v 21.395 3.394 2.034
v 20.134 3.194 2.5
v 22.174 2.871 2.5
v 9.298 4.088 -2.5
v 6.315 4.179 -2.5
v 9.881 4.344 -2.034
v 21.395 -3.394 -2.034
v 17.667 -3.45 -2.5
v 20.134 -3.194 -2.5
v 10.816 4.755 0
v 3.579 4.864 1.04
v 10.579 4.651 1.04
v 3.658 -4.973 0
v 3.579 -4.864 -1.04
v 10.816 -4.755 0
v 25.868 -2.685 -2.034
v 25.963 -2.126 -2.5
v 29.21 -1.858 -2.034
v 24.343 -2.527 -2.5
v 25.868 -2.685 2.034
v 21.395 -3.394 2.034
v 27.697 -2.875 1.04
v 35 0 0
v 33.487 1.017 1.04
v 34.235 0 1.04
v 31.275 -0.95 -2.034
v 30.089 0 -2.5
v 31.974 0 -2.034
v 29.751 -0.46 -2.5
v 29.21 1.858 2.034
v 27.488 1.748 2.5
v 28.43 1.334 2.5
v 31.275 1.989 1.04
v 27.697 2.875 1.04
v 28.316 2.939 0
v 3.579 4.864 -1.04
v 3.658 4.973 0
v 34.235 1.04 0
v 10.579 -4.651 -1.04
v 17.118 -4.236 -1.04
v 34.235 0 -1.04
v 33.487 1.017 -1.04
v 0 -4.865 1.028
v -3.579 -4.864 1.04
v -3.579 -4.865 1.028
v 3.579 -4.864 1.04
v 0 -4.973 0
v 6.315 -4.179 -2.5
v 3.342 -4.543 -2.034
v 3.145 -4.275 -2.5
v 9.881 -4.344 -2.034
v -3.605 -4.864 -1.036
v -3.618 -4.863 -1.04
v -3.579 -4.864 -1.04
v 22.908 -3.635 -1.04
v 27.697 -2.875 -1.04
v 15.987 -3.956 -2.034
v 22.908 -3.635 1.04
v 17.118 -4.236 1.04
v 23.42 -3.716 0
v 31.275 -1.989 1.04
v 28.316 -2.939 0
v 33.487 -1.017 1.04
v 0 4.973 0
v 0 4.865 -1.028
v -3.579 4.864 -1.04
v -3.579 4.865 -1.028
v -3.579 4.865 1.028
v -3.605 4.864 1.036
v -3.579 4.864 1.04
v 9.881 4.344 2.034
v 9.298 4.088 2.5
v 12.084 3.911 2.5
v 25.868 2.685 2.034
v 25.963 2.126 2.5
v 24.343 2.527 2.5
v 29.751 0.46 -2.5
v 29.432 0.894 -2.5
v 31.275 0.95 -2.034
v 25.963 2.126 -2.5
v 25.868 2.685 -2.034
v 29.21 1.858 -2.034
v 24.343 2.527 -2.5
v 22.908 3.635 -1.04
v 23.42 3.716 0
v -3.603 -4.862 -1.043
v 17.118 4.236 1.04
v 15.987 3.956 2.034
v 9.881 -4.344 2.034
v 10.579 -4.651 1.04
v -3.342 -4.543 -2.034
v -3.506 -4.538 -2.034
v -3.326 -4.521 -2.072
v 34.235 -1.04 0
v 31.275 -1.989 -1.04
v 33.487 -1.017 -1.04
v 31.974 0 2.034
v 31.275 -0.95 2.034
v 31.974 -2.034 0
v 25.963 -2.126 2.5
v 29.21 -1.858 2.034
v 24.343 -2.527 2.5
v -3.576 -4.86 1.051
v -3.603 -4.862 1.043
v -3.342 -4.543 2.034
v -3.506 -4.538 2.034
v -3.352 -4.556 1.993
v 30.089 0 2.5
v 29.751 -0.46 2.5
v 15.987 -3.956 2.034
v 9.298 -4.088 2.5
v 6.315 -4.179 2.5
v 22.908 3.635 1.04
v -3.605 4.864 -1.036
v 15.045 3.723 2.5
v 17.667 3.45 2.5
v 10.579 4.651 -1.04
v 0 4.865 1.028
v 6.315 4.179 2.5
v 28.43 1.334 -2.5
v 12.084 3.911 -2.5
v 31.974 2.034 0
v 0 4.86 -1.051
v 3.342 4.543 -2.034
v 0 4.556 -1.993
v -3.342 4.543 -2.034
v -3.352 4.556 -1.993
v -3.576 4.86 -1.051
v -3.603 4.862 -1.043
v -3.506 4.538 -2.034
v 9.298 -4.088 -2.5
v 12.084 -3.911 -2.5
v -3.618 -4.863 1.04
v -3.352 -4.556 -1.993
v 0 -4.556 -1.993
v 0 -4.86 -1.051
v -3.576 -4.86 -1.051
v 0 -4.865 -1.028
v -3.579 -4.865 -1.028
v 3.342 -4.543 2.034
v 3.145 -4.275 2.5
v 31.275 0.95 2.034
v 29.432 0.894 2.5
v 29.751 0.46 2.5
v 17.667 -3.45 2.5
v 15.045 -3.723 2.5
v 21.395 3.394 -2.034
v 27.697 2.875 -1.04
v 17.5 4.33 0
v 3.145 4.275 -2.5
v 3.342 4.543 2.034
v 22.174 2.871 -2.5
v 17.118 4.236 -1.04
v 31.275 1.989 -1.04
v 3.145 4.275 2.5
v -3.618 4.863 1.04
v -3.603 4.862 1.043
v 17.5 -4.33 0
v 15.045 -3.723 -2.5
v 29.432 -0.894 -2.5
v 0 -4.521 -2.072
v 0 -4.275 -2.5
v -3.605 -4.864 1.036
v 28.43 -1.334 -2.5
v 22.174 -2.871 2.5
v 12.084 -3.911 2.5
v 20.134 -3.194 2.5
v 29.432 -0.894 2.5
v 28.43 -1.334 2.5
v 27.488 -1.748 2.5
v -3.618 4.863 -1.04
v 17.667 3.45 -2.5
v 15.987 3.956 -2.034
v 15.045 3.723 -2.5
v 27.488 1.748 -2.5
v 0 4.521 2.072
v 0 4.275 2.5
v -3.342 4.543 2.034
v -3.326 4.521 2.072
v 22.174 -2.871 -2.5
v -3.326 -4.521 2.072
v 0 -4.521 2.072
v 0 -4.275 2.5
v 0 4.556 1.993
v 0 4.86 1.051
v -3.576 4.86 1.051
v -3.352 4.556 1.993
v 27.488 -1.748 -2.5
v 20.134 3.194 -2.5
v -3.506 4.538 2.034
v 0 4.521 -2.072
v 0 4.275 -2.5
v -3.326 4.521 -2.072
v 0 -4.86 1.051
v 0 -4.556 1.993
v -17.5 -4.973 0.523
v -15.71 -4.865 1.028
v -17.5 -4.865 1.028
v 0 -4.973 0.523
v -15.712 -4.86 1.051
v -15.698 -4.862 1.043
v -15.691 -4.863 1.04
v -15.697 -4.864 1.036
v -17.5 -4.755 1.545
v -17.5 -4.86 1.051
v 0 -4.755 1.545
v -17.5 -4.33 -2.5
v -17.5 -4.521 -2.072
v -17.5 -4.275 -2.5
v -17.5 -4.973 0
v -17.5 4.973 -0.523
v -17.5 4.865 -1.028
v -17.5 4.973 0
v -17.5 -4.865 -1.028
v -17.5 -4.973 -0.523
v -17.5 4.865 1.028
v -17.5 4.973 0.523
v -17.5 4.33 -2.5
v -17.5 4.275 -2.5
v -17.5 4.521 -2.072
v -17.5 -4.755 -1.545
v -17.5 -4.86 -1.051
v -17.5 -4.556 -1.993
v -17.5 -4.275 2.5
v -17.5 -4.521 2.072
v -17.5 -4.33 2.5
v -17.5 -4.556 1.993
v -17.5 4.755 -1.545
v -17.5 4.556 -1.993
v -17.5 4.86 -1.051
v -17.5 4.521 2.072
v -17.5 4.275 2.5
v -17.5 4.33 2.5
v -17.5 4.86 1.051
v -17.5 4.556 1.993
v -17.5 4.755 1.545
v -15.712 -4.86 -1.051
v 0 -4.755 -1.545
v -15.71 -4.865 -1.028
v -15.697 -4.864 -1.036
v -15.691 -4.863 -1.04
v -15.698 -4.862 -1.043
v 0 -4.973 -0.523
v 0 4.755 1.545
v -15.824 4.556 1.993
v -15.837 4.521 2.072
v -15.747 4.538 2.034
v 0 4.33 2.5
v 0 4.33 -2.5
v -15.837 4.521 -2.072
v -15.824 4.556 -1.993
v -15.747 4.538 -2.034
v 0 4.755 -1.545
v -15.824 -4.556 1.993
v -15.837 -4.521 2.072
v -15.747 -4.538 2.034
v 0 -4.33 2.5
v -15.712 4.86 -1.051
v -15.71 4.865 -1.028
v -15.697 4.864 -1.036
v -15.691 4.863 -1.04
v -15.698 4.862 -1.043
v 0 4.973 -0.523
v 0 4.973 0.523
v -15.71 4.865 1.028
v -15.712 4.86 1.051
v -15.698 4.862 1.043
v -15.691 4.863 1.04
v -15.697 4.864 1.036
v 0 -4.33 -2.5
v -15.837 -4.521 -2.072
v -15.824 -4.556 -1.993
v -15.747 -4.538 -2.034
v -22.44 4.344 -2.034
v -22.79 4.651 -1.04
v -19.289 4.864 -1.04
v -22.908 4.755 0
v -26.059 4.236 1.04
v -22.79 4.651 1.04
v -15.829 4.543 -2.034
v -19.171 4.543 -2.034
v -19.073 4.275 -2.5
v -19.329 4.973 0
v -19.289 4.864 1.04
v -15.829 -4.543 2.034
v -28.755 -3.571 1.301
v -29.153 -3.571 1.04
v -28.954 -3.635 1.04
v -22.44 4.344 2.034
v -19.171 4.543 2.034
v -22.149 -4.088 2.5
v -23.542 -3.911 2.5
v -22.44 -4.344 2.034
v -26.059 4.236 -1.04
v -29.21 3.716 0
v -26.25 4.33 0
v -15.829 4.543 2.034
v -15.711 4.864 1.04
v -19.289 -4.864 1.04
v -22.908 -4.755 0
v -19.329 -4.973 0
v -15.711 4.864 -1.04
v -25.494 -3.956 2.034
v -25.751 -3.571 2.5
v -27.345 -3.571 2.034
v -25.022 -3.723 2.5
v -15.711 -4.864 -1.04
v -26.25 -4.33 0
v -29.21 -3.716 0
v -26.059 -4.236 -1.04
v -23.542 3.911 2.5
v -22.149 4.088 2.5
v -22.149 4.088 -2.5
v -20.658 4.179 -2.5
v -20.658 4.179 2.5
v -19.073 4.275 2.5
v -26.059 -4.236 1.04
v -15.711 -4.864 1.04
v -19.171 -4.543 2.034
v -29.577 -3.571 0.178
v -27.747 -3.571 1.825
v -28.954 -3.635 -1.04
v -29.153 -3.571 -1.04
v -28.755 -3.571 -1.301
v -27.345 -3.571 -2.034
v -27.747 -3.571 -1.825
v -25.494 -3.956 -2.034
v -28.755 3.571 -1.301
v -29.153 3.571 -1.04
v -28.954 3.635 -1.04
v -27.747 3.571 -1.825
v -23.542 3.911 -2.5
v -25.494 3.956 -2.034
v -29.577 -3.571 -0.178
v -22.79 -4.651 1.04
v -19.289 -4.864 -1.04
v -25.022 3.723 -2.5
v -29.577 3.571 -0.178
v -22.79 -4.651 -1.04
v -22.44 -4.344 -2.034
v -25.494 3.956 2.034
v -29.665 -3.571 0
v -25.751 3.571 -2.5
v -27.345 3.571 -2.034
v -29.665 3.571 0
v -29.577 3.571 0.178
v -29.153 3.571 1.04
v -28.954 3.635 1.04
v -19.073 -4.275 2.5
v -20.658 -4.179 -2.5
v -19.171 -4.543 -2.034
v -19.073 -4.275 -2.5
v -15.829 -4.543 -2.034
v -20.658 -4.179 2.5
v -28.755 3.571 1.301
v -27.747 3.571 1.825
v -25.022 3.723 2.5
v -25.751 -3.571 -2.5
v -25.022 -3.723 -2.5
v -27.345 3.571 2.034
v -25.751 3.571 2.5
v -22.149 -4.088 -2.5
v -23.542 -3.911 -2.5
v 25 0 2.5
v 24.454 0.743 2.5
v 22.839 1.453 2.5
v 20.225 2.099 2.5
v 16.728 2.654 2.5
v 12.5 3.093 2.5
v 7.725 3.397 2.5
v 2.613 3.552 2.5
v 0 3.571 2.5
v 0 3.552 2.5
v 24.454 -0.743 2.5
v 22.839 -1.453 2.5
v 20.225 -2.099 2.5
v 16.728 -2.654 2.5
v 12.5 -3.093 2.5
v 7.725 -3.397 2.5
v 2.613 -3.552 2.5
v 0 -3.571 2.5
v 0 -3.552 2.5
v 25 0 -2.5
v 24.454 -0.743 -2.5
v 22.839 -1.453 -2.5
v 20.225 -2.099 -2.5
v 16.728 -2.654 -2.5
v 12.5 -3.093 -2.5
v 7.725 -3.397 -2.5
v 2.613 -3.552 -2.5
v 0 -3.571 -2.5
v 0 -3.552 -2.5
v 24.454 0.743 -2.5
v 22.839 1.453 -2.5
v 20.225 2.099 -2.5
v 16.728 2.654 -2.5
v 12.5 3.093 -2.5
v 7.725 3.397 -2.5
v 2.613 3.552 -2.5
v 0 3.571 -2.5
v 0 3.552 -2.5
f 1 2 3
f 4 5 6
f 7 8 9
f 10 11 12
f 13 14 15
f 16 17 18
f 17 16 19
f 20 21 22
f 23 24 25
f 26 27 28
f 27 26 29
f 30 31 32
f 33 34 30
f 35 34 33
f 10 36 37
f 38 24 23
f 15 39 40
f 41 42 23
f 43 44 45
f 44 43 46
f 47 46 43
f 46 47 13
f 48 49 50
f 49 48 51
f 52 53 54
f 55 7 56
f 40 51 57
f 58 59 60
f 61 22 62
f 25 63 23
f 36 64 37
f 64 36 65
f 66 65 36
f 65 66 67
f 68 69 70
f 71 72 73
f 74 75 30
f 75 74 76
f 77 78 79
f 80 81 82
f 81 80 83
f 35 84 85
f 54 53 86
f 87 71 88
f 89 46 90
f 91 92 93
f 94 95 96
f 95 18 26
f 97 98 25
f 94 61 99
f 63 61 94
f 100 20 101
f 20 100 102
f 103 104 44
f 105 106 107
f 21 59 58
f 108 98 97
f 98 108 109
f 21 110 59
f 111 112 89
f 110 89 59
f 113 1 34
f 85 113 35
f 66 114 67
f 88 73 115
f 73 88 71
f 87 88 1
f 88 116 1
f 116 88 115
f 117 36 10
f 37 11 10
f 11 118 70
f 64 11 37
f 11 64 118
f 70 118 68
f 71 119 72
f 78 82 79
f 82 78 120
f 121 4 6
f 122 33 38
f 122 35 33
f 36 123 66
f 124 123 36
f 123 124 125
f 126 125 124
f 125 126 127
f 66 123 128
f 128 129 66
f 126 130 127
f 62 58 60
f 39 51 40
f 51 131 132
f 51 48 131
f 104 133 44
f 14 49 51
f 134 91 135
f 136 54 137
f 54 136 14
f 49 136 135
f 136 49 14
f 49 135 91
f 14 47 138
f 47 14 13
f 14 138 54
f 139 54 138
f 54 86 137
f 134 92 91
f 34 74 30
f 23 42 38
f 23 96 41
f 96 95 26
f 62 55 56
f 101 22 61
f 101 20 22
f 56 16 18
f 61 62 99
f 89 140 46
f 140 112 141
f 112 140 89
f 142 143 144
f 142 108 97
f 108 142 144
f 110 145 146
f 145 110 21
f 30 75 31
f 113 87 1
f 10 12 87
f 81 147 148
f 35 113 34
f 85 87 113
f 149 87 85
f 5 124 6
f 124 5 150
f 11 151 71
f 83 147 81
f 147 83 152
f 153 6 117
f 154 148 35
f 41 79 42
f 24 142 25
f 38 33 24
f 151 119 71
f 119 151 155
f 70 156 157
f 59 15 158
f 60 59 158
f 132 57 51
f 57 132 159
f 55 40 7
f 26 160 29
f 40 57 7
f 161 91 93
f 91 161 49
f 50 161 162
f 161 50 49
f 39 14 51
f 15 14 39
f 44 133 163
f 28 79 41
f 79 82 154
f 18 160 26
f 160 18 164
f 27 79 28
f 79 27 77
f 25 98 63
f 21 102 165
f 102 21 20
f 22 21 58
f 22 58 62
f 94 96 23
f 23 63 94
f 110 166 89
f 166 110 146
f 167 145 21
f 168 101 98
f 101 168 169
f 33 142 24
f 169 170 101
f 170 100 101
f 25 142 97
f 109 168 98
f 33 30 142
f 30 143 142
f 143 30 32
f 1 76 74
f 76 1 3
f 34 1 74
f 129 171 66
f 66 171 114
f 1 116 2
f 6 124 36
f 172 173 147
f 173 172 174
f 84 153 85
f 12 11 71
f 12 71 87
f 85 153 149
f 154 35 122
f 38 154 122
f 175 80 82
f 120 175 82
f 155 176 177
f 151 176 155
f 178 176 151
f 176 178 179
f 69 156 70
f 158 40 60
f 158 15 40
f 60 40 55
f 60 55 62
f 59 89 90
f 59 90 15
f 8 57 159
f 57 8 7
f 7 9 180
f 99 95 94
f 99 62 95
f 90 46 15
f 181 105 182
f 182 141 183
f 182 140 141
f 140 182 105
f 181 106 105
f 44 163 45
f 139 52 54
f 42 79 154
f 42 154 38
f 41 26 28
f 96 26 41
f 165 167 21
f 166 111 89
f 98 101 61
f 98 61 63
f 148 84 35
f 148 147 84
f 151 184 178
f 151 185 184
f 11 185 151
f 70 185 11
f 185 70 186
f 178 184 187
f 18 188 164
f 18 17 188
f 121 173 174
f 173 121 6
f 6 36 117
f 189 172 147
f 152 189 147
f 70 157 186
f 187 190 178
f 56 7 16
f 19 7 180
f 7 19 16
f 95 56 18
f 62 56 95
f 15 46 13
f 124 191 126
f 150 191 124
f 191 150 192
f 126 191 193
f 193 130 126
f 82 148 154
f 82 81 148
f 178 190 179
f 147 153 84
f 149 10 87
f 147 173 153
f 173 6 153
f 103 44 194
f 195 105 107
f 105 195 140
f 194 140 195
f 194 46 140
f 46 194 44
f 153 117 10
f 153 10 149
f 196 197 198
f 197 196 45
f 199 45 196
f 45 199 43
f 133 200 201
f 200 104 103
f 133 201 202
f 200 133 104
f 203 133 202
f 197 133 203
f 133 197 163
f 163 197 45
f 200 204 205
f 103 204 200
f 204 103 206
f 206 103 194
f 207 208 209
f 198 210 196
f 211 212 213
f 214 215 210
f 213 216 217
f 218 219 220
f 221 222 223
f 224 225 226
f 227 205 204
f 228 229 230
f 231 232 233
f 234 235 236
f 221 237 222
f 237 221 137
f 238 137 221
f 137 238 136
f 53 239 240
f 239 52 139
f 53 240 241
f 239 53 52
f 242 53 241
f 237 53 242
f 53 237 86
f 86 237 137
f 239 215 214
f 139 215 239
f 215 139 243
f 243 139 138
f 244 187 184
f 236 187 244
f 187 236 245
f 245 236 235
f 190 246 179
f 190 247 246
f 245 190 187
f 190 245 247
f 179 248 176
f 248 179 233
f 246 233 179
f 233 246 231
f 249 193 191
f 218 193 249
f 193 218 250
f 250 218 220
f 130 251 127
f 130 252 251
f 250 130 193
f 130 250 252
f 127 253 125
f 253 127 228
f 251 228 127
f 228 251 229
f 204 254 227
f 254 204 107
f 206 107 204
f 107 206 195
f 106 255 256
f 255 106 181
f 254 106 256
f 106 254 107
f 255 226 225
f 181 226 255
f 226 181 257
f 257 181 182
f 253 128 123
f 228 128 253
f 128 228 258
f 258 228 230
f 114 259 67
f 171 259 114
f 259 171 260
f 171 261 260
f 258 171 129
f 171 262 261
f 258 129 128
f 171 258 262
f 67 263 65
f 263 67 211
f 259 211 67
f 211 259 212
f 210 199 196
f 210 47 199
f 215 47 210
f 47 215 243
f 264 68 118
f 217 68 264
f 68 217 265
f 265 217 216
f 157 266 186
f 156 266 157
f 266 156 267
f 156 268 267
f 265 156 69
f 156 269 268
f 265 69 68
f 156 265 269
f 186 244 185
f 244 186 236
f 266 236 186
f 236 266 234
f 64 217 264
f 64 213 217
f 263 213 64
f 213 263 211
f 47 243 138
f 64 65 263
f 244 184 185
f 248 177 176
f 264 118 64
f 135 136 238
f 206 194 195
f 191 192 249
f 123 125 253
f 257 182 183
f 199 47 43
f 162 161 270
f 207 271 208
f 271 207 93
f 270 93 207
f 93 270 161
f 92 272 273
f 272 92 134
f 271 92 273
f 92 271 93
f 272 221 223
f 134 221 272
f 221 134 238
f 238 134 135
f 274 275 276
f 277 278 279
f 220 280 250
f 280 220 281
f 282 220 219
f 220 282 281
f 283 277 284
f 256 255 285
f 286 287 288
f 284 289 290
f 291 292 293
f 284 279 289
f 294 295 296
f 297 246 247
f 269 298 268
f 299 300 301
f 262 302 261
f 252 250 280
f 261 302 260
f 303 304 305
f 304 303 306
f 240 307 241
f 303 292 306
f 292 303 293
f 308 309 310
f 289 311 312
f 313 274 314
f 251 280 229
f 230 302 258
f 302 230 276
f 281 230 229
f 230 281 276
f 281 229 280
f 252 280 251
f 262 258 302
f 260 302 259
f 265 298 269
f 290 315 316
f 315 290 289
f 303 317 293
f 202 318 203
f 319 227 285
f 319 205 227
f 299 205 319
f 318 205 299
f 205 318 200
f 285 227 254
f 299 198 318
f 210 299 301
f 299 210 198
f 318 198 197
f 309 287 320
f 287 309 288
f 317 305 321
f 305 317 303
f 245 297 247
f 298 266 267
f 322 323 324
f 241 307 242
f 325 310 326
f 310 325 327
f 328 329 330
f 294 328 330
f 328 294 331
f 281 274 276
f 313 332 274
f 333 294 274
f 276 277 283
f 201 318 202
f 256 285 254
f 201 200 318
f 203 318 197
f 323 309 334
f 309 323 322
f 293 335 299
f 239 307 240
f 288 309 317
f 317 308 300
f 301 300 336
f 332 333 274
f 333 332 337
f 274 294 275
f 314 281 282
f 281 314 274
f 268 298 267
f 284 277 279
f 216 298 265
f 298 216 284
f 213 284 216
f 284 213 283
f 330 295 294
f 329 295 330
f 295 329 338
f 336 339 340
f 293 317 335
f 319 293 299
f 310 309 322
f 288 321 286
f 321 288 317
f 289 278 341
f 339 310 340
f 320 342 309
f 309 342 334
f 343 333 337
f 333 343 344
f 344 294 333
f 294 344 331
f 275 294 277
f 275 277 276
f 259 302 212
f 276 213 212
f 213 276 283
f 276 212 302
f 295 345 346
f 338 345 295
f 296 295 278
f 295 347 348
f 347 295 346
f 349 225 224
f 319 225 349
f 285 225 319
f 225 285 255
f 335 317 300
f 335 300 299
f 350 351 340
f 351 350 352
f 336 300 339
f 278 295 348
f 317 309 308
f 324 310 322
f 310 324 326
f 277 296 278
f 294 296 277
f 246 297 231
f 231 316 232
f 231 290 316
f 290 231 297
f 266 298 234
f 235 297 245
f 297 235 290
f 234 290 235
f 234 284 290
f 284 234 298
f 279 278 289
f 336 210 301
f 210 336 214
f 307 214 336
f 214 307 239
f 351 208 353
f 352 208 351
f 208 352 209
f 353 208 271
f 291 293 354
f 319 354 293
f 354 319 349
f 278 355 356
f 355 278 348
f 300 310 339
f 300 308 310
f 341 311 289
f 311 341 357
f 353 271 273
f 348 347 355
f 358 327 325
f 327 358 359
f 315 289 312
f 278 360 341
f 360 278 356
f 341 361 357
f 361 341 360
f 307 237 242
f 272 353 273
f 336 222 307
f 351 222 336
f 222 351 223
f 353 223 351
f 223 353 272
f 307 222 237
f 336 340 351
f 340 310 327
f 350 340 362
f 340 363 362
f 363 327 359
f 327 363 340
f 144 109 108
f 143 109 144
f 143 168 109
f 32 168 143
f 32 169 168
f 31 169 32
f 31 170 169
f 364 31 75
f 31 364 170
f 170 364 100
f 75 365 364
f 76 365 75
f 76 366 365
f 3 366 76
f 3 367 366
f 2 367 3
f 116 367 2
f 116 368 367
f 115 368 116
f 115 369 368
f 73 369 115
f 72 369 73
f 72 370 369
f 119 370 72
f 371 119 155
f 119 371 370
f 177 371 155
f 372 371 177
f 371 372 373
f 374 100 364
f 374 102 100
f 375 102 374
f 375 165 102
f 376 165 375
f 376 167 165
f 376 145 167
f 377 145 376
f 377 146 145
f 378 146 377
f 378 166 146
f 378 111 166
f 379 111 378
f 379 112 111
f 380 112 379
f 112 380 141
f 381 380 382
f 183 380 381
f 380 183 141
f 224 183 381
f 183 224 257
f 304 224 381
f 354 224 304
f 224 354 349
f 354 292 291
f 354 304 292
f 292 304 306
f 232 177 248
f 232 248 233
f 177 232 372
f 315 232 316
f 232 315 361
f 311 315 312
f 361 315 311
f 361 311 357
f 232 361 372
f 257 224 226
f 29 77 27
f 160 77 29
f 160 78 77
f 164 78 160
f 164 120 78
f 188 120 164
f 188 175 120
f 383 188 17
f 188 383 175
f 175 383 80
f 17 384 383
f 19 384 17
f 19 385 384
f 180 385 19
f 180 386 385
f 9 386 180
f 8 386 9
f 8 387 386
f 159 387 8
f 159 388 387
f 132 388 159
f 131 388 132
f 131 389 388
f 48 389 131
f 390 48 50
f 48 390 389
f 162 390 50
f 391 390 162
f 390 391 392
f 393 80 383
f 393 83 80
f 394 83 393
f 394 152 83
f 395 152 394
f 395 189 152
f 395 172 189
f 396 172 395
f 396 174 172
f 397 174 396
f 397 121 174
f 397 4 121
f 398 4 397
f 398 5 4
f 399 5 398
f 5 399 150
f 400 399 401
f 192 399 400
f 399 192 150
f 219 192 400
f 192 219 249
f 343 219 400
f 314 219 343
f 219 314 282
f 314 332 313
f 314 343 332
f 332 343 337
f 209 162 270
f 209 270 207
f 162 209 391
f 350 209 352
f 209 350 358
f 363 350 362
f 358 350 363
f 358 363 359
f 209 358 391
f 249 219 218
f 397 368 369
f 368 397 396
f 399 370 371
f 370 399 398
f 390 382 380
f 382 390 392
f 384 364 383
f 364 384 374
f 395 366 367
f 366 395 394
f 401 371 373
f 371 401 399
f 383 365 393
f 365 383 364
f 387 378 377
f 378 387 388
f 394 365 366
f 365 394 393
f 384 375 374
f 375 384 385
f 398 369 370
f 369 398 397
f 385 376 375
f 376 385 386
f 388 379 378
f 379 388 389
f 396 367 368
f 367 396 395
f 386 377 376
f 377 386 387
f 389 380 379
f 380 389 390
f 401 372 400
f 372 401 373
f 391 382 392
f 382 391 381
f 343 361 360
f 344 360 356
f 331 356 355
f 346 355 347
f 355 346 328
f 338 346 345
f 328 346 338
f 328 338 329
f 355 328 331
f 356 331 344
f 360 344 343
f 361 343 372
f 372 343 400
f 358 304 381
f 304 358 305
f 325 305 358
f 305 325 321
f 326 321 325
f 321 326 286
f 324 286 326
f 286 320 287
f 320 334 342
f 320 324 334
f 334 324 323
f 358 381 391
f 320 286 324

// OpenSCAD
//Author: Jasper den Ouden
//This one is public domain

l=70;
t=10;

scale([1,1/7,1/7]) intersection()
{   union()
    {   sphere(l/2);
        rotate([0,-90,0]) cylinder(r=l/2,h=l/4);
        translate([-l/4,0]) scale([1/2,1,1]) sphere(l/2);
    }
    difference()
    {   cube([l,l,l/2], center=true);
        translate([0,0,-l]) cylinder(r=l/2-t,h=3*l);
        translate([-l,0]) cube([2*l,l-2*t,l], center=true);
    }
}
